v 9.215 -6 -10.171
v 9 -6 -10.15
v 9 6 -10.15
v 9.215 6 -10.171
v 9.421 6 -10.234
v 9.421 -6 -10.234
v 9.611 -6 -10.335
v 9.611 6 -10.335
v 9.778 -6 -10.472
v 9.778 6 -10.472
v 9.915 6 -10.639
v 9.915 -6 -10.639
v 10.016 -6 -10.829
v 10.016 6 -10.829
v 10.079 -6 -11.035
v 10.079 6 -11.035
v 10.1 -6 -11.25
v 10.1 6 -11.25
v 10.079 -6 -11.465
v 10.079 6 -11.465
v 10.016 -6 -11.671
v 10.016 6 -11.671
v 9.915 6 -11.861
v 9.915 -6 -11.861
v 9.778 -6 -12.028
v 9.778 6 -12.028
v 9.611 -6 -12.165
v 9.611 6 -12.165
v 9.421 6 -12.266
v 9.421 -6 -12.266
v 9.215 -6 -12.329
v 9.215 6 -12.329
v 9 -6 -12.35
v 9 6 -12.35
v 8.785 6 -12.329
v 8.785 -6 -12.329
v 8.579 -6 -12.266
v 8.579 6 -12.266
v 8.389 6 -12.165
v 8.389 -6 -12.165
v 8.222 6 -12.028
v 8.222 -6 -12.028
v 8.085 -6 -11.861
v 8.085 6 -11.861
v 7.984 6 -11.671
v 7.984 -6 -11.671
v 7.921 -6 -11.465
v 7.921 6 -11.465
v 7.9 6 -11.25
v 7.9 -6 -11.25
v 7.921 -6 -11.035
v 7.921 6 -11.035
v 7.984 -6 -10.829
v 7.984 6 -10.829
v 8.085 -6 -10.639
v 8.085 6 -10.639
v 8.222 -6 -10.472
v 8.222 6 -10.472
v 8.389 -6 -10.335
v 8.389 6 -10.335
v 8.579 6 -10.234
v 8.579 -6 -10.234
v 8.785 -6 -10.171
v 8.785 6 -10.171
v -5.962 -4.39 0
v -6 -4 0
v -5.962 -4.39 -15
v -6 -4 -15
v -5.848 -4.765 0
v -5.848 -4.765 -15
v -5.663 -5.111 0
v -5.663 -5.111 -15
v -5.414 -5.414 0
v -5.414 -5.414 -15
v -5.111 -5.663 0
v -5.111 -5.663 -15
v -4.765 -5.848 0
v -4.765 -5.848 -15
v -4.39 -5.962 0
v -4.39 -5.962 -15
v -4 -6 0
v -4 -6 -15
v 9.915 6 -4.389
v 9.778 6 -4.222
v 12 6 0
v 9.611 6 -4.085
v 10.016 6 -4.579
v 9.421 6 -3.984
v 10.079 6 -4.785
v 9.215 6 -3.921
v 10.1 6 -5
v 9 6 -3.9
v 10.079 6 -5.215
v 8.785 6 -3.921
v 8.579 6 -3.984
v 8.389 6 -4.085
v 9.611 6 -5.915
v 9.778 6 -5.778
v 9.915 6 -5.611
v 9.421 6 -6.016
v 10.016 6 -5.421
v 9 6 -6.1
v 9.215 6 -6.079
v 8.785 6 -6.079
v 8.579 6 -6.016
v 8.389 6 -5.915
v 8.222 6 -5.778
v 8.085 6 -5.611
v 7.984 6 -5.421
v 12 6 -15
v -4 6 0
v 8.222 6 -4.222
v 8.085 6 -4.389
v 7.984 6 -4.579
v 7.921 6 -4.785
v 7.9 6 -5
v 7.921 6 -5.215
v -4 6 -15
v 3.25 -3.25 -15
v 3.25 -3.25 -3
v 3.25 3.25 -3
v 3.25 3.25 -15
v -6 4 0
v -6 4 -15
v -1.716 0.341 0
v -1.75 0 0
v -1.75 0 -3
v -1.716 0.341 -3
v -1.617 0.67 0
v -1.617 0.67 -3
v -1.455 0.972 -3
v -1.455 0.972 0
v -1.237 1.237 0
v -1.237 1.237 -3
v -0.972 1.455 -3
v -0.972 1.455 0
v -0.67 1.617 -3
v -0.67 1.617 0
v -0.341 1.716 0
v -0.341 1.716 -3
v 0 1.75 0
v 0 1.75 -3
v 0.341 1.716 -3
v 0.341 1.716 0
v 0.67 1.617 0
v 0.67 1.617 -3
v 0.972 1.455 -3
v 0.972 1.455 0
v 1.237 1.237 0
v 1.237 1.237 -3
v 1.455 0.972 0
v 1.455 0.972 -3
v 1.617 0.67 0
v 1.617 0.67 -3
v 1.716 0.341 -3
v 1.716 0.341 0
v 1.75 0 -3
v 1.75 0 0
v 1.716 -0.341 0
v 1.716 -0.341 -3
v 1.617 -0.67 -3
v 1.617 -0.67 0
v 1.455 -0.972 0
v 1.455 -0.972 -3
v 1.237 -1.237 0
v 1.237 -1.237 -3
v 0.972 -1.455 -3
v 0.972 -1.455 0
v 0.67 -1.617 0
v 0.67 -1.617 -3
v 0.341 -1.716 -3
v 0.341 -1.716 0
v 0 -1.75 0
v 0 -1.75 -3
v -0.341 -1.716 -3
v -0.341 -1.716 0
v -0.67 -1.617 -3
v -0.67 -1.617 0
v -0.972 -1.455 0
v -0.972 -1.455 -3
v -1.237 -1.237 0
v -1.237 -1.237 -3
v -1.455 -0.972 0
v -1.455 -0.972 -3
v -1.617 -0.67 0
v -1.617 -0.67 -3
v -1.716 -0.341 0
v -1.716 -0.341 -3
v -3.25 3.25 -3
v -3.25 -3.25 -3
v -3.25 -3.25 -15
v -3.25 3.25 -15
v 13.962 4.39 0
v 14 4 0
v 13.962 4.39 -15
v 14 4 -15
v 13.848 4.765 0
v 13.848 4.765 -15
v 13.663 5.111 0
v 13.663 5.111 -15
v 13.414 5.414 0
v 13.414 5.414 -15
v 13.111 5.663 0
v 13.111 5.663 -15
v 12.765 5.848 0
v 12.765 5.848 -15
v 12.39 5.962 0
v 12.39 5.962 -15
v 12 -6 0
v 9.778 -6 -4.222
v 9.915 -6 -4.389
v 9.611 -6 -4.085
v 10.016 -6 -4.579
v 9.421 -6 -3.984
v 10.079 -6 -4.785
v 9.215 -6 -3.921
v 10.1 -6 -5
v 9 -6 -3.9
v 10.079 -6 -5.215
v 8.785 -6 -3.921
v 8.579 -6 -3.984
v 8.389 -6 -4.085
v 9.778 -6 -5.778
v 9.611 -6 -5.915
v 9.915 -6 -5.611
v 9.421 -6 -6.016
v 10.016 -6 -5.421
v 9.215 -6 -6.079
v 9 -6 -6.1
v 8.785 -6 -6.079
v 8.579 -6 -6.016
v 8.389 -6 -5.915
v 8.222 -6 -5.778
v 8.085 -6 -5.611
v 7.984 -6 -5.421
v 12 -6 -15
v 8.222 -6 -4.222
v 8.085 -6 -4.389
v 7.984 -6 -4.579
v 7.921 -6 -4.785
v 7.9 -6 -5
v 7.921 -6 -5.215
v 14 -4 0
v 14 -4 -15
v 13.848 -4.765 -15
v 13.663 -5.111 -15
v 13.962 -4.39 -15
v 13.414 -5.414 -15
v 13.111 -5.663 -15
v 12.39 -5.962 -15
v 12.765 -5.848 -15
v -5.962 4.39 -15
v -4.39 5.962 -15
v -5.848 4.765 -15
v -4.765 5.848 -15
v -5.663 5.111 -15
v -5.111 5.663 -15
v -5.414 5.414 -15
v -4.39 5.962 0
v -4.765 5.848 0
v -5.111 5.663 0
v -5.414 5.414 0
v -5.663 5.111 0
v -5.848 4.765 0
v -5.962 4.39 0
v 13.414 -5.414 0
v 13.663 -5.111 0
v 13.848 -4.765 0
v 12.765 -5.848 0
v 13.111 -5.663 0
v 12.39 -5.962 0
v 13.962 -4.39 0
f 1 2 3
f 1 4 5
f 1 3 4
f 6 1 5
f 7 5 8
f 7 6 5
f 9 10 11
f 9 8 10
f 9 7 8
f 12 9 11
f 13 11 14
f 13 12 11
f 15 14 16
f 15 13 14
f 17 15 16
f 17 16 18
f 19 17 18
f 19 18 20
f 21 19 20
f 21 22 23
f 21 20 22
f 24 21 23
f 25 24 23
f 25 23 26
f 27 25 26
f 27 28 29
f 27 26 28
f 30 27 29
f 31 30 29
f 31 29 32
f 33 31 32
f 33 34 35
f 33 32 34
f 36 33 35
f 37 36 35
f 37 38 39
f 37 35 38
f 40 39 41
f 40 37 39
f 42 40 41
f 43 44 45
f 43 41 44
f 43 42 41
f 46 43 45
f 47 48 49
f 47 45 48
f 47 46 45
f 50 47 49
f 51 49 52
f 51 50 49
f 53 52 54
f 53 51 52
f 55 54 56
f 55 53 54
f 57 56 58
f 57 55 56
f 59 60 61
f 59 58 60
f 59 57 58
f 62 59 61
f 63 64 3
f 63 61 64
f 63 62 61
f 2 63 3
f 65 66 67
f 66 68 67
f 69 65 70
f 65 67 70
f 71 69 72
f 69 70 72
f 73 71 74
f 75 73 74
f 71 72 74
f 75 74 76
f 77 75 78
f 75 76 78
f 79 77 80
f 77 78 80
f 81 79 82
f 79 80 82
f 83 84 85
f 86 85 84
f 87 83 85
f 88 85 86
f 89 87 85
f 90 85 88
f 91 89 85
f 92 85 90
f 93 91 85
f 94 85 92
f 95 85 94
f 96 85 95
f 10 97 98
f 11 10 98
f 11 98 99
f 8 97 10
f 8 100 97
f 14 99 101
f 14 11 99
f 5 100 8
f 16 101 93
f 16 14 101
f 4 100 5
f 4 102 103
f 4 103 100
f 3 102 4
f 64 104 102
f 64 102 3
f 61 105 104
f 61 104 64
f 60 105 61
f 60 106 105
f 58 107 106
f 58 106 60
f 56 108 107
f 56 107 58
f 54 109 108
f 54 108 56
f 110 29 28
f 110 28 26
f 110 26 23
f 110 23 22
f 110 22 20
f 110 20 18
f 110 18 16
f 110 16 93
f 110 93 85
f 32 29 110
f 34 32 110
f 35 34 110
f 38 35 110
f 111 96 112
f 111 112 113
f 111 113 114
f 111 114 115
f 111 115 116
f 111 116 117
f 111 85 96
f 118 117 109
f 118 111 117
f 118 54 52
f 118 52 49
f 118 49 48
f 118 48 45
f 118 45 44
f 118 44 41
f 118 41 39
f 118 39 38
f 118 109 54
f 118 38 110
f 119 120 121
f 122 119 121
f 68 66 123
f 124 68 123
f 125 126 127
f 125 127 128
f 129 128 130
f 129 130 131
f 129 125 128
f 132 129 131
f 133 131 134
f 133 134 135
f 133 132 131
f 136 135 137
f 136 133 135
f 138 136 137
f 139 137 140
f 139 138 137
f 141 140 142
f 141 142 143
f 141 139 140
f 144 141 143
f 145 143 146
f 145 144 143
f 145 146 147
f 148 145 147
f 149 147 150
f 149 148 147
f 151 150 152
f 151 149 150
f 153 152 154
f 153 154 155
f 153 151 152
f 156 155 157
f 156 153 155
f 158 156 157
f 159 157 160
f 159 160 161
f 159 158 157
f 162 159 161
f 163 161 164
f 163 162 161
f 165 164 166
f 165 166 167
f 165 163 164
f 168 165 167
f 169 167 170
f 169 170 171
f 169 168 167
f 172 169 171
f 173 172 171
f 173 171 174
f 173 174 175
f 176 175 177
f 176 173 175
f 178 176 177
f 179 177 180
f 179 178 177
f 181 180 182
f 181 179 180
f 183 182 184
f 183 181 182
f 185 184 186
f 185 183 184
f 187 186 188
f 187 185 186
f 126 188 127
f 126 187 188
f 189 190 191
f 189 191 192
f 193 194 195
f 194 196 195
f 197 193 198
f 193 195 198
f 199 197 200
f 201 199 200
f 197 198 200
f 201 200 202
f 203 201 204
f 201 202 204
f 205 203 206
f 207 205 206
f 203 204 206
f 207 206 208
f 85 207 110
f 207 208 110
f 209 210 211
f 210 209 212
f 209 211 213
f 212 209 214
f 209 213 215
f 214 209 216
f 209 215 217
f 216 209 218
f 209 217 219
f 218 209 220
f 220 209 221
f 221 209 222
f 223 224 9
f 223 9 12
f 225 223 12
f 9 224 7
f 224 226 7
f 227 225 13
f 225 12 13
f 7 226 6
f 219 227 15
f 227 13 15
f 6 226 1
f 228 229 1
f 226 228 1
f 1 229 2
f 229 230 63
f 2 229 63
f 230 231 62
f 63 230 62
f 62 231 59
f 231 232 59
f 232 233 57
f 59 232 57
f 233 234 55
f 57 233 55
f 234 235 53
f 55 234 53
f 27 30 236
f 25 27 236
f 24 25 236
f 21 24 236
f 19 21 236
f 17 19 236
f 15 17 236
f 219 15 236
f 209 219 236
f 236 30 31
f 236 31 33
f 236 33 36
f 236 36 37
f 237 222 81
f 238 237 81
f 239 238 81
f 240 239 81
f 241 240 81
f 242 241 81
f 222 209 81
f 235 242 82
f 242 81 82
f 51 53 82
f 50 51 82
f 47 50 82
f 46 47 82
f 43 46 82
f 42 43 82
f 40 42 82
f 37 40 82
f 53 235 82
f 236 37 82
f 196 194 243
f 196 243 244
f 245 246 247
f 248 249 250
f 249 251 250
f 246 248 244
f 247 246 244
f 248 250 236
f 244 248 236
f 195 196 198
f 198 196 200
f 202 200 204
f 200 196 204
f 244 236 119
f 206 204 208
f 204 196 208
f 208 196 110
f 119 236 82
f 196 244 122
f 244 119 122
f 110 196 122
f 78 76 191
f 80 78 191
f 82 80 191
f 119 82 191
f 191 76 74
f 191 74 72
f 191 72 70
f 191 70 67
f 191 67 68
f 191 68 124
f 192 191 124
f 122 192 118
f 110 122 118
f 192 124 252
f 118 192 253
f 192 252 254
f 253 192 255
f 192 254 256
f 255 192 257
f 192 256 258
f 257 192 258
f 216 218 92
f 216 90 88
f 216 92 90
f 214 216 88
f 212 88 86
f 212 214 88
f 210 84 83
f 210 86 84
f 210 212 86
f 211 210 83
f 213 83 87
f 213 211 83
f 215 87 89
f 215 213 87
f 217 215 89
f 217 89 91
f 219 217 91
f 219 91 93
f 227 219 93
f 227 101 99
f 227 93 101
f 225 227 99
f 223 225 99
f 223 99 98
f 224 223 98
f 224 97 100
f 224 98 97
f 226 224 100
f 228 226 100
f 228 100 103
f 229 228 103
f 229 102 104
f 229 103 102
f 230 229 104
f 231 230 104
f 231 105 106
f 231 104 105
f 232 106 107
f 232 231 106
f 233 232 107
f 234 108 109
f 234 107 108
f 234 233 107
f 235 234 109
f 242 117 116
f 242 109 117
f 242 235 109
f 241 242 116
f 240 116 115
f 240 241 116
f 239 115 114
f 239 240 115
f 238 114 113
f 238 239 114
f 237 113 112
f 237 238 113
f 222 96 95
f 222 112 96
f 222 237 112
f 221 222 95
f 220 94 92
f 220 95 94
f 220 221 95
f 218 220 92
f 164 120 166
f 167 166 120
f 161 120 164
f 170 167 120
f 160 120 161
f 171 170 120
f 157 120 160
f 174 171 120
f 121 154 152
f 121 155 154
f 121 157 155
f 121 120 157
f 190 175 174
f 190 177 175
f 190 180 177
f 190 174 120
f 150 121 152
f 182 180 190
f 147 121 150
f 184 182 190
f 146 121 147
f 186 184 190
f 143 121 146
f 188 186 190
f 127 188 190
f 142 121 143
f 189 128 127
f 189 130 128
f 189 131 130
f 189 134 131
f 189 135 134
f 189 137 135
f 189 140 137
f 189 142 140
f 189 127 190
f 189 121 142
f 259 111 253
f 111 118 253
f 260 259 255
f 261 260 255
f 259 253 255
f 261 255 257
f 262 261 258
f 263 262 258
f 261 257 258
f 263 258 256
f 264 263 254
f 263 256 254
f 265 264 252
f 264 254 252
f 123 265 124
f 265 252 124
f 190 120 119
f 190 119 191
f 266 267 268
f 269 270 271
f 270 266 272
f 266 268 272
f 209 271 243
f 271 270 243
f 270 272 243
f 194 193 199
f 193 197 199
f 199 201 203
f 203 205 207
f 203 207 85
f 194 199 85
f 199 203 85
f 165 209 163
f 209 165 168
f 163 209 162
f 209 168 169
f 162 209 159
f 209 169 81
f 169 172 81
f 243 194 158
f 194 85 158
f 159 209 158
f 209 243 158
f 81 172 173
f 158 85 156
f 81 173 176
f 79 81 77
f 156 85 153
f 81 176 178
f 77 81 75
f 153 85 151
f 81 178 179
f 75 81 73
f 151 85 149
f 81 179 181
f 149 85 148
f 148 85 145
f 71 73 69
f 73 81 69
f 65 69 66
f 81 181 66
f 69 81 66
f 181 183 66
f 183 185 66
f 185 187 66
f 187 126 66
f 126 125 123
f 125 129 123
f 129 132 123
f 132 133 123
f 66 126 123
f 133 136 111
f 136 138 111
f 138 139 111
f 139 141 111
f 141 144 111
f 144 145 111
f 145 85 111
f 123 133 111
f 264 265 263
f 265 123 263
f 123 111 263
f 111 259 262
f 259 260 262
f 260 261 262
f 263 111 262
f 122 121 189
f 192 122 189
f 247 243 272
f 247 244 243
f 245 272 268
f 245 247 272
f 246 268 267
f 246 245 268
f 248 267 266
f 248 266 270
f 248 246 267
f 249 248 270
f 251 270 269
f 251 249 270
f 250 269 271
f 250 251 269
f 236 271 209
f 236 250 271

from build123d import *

# Parameters (mm, degrees)
SKETCH1_R               = 4.5
SKETCH1_R_2             = 1.25
BOSS_EXTRUDE1_DEPTH     = 8
SKETCH2_R               = 1.75
SKETCH2_R_2             = 1.25
CUT_EXTRUDE1_DEPTH      = 4
SKETCH4_W               = 12
SKETCH4_H               = 12
SKETCH4_W_2             = 6.5
SKETCH4_H_2             = 6.5
BOSS_EXTRUDE2_DEPTH     = 15
SKETCH5_W               = 15
SKETCH5_H               = 12
BOSS_EXTRUDE3_DEPTH     = 8
CUT_EXTRUDE2_DEPTH      = 24.769728648
CUT_EXTRUDE2_DEPTH_BACK = 24.769728648
SKETCH6_R               = 1.1
FILLET1_R               = 2
SKETCH1_2_R             = 4.5
SKETCH1_2_R_2           = 1.25
CUT_EXTRUDE5_DEPTH      = 8
BOSS_EXTRUDE5_OUTLINE_W = 6.5
BOSS_EXTRUDE5_OUTLINE_H = 6.5
BOSS_EXTRUDE5_OUTLINE_R = 1.75
BOSS_EXTRUDE5_DEPTH     = 3


# Read off the part's stored shape, not the designer's step: Boss-Extrude5
with BuildPart() as part:
    # Sketch1 → Boss-Extrude1 (new body)
    with BuildSketch(Plane.XY):
        Circle(SKETCH1_R)
        Circle(SKETCH1_R_2, mode=Mode.SUBTRACT)
    extrude(amount=BOSS_EXTRUDE1_DEPTH)

    # Sketch2 → Cut-Extrude1 (cut)
    with BuildSketch(Plane(origin=(0, 0, 0), x_dir=(-1, 0, 0), z_dir=(0, 0, -1))):
        Circle(SKETCH2_R)
        Circle(SKETCH2_R_2, mode=Mode.SUBTRACT)
    extrude(amount=-CUT_EXTRUDE1_DEPTH, mode=Mode.SUBTRACT)

    # Sketch4 → Boss-Extrude2 (add)
    with BuildSketch(Plane(origin=(0, 0, 0), x_dir=(-1, 0, 0), z_dir=(0, 0, -1))):
        Rectangle(SKETCH4_W, SKETCH4_H)
        Rectangle(SKETCH4_W_2, SKETCH4_H_2, mode=Mode.SUBTRACT)
    extrude(amount=BOSS_EXTRUDE2_DEPTH)

    # Sketch5 → Boss-Extrude3 (add)
    with BuildSketch(Plane(origin=(6, 0, 0), x_dir=(0, 0, -1), z_dir=(1, 0, 0))):
        with Locations((7.5, 0)):
            Rectangle(SKETCH5_W, SKETCH5_H)
    extrude(amount=BOSS_EXTRUDE3_DEPTH)

    # Sketch6 → Cut-Extrude2 (cut, two sides: drawn at the far end of the back side and taken through both)
    with BuildSketch(Plane(origin=(0, 6, 0), x_dir=(1, 0, 0), z_dir=(0, 1, 0)).offset(-CUT_EXTRUDE2_DEPTH_BACK)):
        with Locations(Location((9, 11.25, 0), (0, 0, 270))):
            Circle(SKETCH6_R)
        with Locations(Location((9, 5, 0), (0, 0, 270))):
            Circle(SKETCH6_R)
    extrude(amount=CUT_EXTRUDE2_DEPTH + CUT_EXTRUDE2_DEPTH_BACK, mode=Mode.SUBTRACT)

    # Fillet1
    fillet1_edges = [part.edges().sort_by_distance(p)[0] for p in [
        (-6, -6, -7.5),
        (-6, 6, -7.5),
        (14, 6, -7.5),
        (14, -6, -7.5),
    ]]
    fillet(fillet1_edges, radius=FILLET1_R)

    # Sketch1<2> → Cut-Extrude5 (cut)
    with BuildSketch(Plane.XY):
        Circle(SKETCH1_2_R)
        Circle(SKETCH1_2_R_2, mode=Mode.SUBTRACT)
    extrude(amount=CUT_EXTRUDE5_DEPTH, mode=Mode.SUBTRACT)

    # Boss-Extrude5 outline → Boss-Extrude5 (add)
    with BuildSketch(Plane(origin=(0, 0, 0), x_dir=(-1, 0, 0), z_dir=(0, 0, -1))):
        Rectangle(BOSS_EXTRUDE5_OUTLINE_W, BOSS_EXTRUDE5_OUTLINE_H)
        Circle(BOSS_EXTRUDE5_OUTLINE_R, mode=Mode.SUBTRACT)
    extrude(amount=BOSS_EXTRUDE5_DEPTH)


solid = part.part
